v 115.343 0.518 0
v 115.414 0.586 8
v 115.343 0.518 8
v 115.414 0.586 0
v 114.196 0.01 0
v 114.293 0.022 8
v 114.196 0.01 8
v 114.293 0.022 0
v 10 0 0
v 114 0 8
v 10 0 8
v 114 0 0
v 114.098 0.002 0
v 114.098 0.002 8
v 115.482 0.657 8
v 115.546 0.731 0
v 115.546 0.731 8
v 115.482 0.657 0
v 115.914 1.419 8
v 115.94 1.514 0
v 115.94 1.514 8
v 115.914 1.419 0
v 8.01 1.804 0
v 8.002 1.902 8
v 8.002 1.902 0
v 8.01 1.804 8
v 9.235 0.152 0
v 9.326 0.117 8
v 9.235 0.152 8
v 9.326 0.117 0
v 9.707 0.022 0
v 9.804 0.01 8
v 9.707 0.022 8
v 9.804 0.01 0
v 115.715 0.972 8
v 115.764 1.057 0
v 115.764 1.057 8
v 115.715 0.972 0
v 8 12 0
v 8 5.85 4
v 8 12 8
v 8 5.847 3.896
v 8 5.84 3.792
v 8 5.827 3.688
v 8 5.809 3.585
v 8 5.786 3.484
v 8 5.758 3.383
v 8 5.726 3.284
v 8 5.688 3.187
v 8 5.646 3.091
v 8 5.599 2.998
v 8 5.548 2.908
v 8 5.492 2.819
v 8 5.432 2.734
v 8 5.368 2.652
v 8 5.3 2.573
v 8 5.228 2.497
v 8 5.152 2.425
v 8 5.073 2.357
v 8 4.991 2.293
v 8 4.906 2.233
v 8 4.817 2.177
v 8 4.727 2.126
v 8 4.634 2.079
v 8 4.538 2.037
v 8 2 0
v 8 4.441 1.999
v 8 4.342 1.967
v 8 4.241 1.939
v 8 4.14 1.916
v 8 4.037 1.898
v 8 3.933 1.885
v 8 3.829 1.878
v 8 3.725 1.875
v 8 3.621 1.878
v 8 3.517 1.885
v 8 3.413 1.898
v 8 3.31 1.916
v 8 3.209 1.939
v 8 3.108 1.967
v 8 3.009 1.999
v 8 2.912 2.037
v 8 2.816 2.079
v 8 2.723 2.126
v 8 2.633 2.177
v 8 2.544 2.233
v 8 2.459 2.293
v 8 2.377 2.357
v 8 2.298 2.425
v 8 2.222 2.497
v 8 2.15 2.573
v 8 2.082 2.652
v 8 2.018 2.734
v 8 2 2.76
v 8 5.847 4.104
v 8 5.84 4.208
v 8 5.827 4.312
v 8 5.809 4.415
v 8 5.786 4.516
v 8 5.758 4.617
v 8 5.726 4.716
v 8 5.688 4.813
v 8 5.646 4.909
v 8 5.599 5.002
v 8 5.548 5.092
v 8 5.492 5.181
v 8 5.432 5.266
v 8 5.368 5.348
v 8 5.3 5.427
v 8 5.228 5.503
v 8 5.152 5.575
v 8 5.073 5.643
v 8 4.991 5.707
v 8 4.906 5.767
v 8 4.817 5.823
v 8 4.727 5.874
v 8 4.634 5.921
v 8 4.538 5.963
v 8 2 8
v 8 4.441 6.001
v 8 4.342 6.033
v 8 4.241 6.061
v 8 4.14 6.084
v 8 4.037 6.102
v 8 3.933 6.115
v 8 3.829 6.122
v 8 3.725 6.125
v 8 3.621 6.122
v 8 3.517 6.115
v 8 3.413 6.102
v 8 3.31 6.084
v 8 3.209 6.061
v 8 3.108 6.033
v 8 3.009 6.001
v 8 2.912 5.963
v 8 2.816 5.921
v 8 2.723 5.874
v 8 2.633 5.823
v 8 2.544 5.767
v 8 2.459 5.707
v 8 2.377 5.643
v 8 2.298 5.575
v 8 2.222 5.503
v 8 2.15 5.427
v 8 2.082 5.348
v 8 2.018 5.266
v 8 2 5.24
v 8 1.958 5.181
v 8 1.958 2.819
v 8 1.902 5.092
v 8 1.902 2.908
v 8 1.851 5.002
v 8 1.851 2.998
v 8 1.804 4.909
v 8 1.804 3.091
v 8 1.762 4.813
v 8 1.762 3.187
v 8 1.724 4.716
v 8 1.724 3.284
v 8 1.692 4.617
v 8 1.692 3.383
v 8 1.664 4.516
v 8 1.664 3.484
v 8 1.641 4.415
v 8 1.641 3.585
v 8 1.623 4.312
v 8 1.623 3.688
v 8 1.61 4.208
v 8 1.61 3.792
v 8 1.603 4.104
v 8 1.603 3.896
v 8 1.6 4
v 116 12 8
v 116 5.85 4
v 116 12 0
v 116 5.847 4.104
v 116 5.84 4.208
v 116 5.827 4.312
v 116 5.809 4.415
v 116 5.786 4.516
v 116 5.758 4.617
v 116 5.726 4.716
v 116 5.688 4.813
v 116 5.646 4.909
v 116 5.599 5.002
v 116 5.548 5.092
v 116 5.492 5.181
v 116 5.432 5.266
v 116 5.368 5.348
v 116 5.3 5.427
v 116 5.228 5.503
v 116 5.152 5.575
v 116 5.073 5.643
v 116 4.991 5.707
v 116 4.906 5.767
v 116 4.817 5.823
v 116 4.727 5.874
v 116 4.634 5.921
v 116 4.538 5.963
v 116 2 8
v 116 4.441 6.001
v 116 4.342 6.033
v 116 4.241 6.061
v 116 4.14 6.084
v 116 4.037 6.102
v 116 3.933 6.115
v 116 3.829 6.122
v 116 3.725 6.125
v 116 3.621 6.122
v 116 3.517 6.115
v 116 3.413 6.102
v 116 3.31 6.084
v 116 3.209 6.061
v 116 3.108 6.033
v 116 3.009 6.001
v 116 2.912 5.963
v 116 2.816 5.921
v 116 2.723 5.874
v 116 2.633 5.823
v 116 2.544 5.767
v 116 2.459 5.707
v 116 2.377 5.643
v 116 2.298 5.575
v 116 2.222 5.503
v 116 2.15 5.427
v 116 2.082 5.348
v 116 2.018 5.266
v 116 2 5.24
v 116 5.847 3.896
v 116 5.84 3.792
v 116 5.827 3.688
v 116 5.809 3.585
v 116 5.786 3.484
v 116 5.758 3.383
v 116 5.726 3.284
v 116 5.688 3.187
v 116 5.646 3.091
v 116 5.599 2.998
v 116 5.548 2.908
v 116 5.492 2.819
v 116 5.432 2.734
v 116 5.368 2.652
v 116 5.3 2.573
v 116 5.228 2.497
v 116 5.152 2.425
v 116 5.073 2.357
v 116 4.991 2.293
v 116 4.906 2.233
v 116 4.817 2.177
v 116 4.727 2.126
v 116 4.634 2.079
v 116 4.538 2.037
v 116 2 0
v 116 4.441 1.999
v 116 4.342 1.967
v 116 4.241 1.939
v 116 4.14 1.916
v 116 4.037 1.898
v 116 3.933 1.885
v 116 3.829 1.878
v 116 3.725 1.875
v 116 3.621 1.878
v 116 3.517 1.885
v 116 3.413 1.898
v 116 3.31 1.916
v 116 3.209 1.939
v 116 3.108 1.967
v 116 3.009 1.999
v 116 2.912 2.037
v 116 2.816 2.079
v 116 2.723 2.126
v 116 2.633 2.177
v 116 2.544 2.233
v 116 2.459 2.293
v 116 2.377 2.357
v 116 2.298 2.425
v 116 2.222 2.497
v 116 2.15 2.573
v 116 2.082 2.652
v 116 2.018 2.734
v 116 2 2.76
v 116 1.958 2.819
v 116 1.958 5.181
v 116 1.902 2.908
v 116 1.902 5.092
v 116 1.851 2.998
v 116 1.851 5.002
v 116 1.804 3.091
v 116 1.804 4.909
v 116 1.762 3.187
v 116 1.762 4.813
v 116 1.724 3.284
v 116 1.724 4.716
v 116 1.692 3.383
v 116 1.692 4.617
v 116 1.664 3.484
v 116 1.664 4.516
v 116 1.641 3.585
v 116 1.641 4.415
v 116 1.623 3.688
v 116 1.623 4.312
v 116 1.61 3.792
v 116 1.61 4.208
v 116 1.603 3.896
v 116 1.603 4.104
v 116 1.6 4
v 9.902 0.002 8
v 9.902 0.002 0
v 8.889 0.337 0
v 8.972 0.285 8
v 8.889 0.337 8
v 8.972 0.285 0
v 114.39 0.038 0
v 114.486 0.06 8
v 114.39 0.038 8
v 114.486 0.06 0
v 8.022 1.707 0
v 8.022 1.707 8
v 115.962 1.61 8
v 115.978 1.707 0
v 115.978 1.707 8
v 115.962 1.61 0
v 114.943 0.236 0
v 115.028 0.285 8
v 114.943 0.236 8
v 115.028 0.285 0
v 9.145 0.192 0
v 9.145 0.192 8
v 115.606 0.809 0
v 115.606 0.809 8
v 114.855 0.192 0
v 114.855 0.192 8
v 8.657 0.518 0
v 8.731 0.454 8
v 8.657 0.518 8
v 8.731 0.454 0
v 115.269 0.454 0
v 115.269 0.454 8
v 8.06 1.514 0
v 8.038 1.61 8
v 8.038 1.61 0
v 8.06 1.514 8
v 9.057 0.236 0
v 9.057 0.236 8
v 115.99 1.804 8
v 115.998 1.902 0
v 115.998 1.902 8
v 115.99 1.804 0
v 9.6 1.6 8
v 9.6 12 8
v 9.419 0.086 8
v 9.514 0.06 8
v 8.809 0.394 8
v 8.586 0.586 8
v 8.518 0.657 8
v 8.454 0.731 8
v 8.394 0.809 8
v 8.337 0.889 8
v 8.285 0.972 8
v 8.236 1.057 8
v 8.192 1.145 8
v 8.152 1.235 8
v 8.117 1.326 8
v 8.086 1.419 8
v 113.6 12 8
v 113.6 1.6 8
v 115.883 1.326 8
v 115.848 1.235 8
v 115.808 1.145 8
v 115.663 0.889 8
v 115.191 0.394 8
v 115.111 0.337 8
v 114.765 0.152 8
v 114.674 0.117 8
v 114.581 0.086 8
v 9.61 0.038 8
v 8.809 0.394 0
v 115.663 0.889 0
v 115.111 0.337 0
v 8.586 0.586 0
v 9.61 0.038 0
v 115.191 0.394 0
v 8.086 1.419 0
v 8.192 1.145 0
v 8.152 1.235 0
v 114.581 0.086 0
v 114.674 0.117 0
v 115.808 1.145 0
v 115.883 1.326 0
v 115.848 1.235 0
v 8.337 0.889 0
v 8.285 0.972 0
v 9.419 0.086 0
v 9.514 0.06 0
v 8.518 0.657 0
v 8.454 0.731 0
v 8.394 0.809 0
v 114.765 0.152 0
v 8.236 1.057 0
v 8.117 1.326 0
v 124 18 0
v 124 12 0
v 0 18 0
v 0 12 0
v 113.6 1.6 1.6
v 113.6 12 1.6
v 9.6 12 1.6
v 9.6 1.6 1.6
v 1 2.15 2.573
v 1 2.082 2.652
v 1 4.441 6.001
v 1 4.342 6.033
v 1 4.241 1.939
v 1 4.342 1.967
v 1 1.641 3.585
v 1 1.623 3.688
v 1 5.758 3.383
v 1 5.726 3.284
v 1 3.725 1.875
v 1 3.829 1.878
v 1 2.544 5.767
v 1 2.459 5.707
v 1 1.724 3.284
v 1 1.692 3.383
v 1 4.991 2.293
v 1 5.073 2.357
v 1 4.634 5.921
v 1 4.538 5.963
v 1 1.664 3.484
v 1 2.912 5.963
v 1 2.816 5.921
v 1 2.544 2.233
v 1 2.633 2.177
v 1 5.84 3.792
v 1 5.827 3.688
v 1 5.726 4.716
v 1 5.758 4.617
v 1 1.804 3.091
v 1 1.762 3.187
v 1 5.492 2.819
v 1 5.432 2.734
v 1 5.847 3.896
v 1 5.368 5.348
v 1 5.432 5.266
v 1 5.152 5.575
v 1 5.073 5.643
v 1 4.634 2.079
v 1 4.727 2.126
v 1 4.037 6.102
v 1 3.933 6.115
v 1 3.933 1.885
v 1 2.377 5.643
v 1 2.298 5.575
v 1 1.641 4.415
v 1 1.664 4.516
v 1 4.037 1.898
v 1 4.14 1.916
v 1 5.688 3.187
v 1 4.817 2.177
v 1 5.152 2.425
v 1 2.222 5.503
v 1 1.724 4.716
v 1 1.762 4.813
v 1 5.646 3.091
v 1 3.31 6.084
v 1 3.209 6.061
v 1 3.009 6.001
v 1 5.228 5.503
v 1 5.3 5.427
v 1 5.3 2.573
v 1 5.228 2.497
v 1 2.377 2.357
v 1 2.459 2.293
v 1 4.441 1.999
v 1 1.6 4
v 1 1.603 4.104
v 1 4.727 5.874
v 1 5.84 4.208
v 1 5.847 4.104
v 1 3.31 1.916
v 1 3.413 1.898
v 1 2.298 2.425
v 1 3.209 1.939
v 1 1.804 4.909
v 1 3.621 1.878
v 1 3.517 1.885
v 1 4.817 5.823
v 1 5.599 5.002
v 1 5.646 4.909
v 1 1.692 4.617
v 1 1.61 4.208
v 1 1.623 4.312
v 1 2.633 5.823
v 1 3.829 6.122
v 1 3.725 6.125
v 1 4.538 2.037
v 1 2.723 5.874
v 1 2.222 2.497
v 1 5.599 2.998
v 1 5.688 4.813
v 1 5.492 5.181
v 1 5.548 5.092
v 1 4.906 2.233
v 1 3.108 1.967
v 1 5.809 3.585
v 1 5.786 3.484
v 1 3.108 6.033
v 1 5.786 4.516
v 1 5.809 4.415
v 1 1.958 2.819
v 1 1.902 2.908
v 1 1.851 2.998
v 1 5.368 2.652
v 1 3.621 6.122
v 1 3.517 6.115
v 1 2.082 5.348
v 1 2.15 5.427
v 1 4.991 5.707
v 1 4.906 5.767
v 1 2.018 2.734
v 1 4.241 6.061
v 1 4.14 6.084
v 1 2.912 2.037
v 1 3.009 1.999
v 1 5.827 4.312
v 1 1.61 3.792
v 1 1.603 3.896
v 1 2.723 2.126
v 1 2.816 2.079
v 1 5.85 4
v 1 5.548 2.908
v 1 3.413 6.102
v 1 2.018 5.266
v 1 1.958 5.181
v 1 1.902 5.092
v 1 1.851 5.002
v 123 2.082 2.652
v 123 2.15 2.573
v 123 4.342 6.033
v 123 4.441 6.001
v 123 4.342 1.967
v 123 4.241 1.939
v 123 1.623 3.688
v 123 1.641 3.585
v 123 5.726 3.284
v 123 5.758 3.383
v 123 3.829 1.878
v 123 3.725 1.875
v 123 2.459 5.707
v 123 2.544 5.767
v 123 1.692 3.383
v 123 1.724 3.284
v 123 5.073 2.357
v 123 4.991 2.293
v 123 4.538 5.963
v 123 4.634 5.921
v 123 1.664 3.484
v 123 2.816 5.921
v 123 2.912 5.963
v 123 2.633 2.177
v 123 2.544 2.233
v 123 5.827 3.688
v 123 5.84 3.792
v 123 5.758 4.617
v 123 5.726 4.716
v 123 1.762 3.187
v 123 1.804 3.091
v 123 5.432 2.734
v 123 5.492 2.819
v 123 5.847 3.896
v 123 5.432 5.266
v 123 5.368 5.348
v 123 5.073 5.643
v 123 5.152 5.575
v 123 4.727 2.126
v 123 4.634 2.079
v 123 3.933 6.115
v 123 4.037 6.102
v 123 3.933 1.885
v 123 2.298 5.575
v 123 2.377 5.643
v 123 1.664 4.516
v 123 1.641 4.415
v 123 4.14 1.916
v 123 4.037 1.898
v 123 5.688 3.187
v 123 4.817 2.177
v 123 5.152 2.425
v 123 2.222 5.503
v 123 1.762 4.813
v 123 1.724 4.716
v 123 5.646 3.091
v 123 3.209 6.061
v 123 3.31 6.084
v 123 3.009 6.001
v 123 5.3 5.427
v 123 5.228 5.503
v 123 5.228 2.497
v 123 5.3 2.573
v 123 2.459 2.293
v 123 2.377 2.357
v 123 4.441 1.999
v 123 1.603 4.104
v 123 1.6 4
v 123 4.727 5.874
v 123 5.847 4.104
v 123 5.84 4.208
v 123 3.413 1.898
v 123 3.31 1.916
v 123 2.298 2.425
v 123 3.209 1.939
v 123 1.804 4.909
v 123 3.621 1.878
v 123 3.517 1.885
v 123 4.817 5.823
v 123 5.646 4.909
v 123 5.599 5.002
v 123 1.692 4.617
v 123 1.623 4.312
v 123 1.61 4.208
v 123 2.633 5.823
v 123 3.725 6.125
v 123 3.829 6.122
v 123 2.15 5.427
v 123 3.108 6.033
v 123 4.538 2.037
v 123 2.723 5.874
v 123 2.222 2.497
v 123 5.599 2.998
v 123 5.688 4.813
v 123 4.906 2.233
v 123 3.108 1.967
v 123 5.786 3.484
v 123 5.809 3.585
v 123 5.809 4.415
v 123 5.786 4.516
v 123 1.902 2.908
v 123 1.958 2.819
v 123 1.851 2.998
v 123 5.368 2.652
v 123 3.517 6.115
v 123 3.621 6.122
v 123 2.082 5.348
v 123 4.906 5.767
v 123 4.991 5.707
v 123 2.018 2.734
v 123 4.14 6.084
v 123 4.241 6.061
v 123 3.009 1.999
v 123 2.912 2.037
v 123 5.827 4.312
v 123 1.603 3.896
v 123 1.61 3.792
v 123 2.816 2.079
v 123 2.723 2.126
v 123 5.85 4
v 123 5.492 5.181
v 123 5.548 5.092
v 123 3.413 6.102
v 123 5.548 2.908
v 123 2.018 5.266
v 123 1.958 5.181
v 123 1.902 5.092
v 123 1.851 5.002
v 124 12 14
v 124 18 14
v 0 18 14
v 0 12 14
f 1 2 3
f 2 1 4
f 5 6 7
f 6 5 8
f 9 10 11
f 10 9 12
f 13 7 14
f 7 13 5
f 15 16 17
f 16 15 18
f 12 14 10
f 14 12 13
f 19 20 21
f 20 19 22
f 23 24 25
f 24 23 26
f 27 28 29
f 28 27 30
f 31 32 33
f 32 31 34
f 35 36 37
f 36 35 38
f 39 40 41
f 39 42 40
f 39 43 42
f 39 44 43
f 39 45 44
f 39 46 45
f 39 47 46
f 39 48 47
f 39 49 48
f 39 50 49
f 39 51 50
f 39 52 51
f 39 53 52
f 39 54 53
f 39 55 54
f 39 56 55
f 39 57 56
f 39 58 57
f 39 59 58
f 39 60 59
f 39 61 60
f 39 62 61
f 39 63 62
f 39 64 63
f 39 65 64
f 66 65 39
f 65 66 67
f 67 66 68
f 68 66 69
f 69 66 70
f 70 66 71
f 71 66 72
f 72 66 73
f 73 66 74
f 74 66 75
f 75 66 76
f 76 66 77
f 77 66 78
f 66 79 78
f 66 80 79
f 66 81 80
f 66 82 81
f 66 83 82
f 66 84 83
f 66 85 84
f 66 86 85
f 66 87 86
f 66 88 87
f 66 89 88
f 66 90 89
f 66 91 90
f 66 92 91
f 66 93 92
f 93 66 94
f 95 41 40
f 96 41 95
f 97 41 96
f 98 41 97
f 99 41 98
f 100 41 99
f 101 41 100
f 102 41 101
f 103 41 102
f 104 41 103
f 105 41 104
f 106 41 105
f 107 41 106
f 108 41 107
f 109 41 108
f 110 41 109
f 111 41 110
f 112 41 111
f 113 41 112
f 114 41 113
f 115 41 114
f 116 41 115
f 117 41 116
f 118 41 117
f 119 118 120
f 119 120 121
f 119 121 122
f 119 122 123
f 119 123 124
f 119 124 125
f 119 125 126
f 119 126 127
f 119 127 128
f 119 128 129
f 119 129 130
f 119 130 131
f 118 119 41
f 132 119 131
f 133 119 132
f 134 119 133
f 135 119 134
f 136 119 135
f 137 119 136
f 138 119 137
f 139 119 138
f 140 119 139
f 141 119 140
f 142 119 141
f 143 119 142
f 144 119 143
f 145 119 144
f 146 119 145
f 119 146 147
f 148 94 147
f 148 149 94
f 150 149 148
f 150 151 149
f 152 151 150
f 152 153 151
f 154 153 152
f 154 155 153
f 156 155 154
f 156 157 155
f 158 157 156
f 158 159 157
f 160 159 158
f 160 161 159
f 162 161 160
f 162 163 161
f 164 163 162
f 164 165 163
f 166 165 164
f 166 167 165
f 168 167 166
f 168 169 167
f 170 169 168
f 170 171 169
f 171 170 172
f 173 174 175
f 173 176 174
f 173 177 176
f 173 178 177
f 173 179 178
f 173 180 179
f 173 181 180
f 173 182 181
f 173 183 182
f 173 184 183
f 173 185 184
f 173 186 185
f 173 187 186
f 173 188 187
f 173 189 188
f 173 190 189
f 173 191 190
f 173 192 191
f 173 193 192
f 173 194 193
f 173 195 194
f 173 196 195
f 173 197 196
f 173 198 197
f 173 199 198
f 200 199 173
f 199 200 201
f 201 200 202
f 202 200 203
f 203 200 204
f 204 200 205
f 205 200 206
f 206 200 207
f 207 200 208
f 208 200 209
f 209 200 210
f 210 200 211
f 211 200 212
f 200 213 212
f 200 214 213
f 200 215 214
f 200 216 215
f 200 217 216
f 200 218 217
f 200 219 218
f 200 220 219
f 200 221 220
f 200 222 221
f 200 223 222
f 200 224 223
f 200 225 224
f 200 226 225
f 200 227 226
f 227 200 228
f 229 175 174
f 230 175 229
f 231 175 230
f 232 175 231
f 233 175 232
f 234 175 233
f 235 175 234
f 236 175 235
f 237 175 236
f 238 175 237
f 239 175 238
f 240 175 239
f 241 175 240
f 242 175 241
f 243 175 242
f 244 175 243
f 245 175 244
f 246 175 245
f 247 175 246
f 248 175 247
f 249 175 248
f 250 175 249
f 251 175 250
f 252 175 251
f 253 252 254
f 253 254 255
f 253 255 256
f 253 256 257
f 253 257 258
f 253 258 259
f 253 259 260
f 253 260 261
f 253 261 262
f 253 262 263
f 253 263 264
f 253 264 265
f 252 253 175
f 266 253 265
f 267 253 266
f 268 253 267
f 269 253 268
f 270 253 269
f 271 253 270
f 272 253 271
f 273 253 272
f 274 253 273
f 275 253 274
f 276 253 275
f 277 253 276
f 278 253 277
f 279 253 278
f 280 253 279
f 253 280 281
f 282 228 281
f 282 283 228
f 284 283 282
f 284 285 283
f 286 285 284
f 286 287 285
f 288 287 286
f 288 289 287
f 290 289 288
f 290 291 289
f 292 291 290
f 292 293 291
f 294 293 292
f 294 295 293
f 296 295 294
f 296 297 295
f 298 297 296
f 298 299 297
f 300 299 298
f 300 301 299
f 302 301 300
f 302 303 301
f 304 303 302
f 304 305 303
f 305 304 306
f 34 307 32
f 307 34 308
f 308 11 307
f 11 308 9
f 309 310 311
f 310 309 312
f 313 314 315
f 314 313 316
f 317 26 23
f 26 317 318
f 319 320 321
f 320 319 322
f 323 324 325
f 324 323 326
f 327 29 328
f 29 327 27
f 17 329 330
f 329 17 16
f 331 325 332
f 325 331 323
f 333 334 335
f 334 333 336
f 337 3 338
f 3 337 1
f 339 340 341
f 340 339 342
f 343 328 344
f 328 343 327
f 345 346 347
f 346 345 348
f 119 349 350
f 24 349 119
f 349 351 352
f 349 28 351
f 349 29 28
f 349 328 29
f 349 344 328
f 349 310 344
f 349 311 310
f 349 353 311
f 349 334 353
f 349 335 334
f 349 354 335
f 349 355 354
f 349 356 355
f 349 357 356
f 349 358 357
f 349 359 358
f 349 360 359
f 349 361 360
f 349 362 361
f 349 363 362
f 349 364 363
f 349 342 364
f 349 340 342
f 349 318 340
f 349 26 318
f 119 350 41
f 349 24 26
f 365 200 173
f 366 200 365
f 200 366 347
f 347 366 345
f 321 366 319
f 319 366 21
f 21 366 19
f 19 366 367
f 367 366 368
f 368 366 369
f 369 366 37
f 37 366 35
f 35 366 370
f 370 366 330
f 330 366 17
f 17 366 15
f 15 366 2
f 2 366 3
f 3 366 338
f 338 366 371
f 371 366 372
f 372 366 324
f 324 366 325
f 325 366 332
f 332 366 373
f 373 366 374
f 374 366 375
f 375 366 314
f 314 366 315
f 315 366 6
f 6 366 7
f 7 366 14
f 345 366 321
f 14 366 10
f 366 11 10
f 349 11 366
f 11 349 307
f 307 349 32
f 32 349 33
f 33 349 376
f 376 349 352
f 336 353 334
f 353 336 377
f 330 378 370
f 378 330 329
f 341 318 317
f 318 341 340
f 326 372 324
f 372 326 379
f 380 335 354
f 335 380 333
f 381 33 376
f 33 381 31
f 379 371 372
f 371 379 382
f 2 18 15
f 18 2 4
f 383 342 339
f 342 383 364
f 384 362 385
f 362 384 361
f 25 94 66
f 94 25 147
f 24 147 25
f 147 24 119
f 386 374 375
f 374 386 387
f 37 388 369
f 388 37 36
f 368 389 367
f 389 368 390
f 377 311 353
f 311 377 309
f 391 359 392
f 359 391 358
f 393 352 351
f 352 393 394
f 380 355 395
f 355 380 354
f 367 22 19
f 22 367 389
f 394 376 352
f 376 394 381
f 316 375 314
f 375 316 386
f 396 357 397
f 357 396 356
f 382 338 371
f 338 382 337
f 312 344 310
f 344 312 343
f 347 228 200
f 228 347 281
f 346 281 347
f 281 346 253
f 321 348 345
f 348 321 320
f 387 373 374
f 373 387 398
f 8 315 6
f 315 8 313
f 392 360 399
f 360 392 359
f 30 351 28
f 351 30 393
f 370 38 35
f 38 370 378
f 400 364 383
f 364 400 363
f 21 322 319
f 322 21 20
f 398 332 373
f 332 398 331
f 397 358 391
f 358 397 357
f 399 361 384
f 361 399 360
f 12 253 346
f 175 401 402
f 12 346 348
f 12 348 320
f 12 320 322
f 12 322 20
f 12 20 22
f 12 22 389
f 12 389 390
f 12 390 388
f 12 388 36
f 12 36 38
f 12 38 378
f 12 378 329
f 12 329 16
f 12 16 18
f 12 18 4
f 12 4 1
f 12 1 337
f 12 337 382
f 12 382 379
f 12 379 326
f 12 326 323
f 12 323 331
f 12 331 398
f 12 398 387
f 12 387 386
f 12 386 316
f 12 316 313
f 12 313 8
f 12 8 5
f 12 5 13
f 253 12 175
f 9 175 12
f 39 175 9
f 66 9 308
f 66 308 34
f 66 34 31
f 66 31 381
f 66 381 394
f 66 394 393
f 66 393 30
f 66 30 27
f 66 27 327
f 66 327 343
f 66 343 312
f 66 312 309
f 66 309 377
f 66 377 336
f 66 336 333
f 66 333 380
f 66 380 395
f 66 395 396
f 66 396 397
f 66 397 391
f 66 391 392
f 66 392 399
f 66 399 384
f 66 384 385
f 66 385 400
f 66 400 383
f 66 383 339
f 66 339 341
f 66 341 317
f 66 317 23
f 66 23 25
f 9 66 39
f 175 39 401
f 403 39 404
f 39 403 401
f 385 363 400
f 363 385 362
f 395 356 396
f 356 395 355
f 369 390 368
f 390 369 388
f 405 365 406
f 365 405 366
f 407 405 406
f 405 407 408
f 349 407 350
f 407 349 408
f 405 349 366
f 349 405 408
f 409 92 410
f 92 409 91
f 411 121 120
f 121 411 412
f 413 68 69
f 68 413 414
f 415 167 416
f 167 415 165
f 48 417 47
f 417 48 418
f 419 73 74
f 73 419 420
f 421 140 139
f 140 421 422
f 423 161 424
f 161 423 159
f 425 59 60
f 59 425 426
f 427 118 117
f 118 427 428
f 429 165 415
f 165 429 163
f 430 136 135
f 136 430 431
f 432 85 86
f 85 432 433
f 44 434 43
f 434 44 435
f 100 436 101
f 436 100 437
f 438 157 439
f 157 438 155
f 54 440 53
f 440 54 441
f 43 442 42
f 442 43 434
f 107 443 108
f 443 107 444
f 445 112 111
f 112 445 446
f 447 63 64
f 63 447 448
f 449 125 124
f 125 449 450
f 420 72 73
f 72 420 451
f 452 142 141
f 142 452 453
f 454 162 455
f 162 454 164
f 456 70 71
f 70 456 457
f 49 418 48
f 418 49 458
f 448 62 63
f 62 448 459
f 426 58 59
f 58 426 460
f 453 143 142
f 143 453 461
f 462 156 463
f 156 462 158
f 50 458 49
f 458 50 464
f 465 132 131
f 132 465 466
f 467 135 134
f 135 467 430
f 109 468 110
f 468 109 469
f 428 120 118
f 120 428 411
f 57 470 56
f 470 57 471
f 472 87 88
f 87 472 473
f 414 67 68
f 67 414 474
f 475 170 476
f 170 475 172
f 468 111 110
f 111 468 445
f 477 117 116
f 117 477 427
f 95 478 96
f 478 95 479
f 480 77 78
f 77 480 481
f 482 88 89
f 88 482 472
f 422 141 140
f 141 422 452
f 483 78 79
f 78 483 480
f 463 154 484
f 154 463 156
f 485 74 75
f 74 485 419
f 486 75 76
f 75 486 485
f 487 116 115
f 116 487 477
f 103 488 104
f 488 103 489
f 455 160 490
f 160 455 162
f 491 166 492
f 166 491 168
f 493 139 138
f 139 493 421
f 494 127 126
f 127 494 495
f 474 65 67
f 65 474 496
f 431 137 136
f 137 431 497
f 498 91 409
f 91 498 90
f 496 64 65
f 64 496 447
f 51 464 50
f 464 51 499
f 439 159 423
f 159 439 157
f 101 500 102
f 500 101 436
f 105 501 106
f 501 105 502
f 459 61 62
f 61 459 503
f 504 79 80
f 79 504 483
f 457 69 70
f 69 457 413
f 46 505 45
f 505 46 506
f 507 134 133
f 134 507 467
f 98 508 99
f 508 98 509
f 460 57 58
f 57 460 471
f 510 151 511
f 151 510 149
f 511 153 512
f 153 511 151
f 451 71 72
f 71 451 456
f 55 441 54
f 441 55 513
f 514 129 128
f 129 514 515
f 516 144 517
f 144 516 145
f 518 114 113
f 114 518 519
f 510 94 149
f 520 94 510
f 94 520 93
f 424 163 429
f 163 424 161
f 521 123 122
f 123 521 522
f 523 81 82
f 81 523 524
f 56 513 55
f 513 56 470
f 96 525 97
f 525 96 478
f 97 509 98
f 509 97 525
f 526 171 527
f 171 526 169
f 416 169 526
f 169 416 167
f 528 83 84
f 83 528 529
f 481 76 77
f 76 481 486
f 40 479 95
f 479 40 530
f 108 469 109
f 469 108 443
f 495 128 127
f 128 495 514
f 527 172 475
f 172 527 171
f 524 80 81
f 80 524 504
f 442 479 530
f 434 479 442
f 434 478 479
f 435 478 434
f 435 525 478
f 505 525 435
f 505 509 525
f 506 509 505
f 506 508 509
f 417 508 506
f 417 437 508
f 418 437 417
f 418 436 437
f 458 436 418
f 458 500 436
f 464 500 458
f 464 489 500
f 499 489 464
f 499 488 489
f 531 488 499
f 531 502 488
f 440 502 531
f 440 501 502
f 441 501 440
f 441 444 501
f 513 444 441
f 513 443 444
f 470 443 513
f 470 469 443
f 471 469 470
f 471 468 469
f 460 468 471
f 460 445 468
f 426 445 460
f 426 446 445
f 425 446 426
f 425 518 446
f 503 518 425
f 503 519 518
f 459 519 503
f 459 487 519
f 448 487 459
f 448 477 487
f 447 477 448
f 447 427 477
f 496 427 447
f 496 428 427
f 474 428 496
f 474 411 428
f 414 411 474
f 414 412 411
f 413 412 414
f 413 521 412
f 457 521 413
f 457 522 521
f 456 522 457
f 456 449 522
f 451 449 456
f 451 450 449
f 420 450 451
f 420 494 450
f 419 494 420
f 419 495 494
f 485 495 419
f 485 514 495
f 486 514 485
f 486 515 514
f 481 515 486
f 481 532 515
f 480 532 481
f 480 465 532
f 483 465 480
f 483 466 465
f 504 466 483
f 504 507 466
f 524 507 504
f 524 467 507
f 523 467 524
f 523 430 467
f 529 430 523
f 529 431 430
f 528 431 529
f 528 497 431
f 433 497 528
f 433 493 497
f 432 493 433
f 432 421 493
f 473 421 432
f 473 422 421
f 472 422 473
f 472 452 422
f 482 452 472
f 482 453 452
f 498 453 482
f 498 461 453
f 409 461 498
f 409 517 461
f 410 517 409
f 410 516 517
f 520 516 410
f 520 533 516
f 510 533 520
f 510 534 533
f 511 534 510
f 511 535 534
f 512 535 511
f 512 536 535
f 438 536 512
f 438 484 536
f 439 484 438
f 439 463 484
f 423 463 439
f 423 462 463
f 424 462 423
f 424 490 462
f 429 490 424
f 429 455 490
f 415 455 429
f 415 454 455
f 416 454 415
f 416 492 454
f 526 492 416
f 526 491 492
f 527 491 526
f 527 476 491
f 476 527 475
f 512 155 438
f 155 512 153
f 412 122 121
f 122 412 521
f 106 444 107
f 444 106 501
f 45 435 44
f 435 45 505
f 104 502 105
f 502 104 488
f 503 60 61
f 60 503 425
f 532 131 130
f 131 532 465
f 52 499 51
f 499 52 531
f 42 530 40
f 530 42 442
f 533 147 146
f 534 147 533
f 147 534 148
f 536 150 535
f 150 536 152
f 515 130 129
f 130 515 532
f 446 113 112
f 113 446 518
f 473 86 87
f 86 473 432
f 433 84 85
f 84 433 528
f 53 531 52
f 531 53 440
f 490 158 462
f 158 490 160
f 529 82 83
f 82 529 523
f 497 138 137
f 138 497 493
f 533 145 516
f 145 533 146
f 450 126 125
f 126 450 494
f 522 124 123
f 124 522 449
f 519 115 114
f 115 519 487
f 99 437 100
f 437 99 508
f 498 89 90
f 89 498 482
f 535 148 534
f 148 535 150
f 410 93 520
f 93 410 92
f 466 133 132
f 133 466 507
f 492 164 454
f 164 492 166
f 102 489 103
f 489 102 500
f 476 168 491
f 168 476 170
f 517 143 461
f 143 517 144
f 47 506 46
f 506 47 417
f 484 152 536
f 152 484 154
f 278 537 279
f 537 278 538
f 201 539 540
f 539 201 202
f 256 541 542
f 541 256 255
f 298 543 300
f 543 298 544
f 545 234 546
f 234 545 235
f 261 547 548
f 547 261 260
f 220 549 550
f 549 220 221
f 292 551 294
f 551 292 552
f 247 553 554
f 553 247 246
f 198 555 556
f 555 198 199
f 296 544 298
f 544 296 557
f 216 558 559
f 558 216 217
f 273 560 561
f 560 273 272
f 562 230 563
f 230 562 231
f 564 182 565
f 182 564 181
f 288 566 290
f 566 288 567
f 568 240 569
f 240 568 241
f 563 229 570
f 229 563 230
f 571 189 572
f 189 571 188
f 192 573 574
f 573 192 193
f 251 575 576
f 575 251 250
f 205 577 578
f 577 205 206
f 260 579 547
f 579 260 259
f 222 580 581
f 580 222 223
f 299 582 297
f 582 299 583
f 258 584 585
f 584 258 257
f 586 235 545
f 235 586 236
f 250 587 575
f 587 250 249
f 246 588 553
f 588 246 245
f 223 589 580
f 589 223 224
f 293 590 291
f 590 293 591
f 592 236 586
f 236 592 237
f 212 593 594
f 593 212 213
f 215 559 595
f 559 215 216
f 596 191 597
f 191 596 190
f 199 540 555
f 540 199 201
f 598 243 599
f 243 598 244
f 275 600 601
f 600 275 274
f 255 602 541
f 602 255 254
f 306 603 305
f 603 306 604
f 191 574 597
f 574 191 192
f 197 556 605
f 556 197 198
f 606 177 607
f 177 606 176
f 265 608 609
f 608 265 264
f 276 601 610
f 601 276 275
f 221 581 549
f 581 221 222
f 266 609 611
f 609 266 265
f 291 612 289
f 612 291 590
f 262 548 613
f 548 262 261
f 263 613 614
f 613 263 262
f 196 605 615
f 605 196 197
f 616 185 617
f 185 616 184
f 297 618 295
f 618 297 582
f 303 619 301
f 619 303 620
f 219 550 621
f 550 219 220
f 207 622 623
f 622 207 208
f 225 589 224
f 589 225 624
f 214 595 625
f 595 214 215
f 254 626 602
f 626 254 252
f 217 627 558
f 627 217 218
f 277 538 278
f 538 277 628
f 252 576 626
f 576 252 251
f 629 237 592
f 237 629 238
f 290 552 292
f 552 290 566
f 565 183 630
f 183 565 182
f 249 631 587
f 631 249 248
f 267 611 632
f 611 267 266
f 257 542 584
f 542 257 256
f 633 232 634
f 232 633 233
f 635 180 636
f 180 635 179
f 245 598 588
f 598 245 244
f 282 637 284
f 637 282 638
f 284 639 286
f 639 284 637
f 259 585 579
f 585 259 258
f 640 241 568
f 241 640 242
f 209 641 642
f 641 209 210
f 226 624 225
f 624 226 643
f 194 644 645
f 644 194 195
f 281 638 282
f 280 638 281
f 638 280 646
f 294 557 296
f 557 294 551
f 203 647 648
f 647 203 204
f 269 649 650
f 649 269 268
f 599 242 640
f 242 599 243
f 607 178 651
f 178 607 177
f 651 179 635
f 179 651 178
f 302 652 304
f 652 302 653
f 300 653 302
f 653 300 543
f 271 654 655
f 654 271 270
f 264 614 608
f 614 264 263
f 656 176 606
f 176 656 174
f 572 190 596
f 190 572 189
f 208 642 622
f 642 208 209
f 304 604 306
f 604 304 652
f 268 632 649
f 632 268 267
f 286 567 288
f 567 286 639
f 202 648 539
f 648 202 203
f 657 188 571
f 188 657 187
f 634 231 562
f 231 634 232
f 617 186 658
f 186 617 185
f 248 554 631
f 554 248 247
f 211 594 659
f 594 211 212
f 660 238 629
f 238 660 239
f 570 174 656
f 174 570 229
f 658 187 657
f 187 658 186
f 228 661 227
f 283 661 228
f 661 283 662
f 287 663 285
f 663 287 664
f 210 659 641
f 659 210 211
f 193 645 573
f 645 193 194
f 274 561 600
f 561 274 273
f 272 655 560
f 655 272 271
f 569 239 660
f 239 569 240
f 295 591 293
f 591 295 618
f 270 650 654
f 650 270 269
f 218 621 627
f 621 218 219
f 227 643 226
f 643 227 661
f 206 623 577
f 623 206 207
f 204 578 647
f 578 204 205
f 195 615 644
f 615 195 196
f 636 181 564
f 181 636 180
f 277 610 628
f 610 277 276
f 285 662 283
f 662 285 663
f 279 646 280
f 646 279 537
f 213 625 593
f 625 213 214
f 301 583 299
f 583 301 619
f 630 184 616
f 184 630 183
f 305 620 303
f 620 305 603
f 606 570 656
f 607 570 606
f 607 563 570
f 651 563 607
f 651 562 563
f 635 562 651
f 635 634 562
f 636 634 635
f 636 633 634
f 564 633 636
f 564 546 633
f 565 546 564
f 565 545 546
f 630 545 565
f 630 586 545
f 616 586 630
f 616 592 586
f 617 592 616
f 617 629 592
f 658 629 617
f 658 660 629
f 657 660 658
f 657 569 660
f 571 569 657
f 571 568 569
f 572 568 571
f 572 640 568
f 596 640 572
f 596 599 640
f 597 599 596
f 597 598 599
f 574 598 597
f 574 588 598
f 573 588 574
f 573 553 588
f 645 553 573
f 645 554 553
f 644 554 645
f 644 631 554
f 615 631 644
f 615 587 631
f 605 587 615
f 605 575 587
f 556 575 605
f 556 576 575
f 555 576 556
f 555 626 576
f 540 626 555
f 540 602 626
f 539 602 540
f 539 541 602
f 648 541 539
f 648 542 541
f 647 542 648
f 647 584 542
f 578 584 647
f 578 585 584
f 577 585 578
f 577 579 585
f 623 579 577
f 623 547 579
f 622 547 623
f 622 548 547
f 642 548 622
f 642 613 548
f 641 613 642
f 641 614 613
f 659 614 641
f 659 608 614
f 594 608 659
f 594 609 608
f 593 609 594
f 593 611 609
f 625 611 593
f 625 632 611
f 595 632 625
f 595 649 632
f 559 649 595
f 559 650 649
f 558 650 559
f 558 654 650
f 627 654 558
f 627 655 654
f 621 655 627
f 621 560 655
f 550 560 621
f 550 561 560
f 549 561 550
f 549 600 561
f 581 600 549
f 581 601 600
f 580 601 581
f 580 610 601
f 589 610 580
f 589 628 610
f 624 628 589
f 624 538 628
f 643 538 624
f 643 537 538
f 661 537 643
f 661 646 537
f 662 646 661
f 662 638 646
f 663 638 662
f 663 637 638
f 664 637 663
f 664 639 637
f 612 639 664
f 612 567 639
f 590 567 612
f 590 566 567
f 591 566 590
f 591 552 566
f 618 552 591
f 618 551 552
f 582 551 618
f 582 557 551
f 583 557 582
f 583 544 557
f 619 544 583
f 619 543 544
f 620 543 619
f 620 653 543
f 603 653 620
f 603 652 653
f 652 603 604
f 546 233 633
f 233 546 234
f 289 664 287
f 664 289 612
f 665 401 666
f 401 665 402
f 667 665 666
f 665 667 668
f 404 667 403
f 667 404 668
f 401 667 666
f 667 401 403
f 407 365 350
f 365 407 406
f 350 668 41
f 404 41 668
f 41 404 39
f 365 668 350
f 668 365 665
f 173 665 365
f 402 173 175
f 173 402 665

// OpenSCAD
$fn = 128;

translate([0,12,0])
cube([124, 6, 14]);

t = 1.6;

translate([(124 - 108) / 2,0,0])
union() {


    difference() {

        linear_extrude(8)
        offset(2)
        offset(-2)
        square([108, 12+2]);

        translate([t,t,t])
        cube([104, 12, 8]);
    }

    translate([-7,t + 4.25 / 2,4])
    rotate([0,90,0])
    cylinder(d = 4.25, h = 7);

    translate([108,t + 4.25 / 2,4])
    rotate([0,90,0])
    cylinder(d = 4.25, h = 7);
    
}
